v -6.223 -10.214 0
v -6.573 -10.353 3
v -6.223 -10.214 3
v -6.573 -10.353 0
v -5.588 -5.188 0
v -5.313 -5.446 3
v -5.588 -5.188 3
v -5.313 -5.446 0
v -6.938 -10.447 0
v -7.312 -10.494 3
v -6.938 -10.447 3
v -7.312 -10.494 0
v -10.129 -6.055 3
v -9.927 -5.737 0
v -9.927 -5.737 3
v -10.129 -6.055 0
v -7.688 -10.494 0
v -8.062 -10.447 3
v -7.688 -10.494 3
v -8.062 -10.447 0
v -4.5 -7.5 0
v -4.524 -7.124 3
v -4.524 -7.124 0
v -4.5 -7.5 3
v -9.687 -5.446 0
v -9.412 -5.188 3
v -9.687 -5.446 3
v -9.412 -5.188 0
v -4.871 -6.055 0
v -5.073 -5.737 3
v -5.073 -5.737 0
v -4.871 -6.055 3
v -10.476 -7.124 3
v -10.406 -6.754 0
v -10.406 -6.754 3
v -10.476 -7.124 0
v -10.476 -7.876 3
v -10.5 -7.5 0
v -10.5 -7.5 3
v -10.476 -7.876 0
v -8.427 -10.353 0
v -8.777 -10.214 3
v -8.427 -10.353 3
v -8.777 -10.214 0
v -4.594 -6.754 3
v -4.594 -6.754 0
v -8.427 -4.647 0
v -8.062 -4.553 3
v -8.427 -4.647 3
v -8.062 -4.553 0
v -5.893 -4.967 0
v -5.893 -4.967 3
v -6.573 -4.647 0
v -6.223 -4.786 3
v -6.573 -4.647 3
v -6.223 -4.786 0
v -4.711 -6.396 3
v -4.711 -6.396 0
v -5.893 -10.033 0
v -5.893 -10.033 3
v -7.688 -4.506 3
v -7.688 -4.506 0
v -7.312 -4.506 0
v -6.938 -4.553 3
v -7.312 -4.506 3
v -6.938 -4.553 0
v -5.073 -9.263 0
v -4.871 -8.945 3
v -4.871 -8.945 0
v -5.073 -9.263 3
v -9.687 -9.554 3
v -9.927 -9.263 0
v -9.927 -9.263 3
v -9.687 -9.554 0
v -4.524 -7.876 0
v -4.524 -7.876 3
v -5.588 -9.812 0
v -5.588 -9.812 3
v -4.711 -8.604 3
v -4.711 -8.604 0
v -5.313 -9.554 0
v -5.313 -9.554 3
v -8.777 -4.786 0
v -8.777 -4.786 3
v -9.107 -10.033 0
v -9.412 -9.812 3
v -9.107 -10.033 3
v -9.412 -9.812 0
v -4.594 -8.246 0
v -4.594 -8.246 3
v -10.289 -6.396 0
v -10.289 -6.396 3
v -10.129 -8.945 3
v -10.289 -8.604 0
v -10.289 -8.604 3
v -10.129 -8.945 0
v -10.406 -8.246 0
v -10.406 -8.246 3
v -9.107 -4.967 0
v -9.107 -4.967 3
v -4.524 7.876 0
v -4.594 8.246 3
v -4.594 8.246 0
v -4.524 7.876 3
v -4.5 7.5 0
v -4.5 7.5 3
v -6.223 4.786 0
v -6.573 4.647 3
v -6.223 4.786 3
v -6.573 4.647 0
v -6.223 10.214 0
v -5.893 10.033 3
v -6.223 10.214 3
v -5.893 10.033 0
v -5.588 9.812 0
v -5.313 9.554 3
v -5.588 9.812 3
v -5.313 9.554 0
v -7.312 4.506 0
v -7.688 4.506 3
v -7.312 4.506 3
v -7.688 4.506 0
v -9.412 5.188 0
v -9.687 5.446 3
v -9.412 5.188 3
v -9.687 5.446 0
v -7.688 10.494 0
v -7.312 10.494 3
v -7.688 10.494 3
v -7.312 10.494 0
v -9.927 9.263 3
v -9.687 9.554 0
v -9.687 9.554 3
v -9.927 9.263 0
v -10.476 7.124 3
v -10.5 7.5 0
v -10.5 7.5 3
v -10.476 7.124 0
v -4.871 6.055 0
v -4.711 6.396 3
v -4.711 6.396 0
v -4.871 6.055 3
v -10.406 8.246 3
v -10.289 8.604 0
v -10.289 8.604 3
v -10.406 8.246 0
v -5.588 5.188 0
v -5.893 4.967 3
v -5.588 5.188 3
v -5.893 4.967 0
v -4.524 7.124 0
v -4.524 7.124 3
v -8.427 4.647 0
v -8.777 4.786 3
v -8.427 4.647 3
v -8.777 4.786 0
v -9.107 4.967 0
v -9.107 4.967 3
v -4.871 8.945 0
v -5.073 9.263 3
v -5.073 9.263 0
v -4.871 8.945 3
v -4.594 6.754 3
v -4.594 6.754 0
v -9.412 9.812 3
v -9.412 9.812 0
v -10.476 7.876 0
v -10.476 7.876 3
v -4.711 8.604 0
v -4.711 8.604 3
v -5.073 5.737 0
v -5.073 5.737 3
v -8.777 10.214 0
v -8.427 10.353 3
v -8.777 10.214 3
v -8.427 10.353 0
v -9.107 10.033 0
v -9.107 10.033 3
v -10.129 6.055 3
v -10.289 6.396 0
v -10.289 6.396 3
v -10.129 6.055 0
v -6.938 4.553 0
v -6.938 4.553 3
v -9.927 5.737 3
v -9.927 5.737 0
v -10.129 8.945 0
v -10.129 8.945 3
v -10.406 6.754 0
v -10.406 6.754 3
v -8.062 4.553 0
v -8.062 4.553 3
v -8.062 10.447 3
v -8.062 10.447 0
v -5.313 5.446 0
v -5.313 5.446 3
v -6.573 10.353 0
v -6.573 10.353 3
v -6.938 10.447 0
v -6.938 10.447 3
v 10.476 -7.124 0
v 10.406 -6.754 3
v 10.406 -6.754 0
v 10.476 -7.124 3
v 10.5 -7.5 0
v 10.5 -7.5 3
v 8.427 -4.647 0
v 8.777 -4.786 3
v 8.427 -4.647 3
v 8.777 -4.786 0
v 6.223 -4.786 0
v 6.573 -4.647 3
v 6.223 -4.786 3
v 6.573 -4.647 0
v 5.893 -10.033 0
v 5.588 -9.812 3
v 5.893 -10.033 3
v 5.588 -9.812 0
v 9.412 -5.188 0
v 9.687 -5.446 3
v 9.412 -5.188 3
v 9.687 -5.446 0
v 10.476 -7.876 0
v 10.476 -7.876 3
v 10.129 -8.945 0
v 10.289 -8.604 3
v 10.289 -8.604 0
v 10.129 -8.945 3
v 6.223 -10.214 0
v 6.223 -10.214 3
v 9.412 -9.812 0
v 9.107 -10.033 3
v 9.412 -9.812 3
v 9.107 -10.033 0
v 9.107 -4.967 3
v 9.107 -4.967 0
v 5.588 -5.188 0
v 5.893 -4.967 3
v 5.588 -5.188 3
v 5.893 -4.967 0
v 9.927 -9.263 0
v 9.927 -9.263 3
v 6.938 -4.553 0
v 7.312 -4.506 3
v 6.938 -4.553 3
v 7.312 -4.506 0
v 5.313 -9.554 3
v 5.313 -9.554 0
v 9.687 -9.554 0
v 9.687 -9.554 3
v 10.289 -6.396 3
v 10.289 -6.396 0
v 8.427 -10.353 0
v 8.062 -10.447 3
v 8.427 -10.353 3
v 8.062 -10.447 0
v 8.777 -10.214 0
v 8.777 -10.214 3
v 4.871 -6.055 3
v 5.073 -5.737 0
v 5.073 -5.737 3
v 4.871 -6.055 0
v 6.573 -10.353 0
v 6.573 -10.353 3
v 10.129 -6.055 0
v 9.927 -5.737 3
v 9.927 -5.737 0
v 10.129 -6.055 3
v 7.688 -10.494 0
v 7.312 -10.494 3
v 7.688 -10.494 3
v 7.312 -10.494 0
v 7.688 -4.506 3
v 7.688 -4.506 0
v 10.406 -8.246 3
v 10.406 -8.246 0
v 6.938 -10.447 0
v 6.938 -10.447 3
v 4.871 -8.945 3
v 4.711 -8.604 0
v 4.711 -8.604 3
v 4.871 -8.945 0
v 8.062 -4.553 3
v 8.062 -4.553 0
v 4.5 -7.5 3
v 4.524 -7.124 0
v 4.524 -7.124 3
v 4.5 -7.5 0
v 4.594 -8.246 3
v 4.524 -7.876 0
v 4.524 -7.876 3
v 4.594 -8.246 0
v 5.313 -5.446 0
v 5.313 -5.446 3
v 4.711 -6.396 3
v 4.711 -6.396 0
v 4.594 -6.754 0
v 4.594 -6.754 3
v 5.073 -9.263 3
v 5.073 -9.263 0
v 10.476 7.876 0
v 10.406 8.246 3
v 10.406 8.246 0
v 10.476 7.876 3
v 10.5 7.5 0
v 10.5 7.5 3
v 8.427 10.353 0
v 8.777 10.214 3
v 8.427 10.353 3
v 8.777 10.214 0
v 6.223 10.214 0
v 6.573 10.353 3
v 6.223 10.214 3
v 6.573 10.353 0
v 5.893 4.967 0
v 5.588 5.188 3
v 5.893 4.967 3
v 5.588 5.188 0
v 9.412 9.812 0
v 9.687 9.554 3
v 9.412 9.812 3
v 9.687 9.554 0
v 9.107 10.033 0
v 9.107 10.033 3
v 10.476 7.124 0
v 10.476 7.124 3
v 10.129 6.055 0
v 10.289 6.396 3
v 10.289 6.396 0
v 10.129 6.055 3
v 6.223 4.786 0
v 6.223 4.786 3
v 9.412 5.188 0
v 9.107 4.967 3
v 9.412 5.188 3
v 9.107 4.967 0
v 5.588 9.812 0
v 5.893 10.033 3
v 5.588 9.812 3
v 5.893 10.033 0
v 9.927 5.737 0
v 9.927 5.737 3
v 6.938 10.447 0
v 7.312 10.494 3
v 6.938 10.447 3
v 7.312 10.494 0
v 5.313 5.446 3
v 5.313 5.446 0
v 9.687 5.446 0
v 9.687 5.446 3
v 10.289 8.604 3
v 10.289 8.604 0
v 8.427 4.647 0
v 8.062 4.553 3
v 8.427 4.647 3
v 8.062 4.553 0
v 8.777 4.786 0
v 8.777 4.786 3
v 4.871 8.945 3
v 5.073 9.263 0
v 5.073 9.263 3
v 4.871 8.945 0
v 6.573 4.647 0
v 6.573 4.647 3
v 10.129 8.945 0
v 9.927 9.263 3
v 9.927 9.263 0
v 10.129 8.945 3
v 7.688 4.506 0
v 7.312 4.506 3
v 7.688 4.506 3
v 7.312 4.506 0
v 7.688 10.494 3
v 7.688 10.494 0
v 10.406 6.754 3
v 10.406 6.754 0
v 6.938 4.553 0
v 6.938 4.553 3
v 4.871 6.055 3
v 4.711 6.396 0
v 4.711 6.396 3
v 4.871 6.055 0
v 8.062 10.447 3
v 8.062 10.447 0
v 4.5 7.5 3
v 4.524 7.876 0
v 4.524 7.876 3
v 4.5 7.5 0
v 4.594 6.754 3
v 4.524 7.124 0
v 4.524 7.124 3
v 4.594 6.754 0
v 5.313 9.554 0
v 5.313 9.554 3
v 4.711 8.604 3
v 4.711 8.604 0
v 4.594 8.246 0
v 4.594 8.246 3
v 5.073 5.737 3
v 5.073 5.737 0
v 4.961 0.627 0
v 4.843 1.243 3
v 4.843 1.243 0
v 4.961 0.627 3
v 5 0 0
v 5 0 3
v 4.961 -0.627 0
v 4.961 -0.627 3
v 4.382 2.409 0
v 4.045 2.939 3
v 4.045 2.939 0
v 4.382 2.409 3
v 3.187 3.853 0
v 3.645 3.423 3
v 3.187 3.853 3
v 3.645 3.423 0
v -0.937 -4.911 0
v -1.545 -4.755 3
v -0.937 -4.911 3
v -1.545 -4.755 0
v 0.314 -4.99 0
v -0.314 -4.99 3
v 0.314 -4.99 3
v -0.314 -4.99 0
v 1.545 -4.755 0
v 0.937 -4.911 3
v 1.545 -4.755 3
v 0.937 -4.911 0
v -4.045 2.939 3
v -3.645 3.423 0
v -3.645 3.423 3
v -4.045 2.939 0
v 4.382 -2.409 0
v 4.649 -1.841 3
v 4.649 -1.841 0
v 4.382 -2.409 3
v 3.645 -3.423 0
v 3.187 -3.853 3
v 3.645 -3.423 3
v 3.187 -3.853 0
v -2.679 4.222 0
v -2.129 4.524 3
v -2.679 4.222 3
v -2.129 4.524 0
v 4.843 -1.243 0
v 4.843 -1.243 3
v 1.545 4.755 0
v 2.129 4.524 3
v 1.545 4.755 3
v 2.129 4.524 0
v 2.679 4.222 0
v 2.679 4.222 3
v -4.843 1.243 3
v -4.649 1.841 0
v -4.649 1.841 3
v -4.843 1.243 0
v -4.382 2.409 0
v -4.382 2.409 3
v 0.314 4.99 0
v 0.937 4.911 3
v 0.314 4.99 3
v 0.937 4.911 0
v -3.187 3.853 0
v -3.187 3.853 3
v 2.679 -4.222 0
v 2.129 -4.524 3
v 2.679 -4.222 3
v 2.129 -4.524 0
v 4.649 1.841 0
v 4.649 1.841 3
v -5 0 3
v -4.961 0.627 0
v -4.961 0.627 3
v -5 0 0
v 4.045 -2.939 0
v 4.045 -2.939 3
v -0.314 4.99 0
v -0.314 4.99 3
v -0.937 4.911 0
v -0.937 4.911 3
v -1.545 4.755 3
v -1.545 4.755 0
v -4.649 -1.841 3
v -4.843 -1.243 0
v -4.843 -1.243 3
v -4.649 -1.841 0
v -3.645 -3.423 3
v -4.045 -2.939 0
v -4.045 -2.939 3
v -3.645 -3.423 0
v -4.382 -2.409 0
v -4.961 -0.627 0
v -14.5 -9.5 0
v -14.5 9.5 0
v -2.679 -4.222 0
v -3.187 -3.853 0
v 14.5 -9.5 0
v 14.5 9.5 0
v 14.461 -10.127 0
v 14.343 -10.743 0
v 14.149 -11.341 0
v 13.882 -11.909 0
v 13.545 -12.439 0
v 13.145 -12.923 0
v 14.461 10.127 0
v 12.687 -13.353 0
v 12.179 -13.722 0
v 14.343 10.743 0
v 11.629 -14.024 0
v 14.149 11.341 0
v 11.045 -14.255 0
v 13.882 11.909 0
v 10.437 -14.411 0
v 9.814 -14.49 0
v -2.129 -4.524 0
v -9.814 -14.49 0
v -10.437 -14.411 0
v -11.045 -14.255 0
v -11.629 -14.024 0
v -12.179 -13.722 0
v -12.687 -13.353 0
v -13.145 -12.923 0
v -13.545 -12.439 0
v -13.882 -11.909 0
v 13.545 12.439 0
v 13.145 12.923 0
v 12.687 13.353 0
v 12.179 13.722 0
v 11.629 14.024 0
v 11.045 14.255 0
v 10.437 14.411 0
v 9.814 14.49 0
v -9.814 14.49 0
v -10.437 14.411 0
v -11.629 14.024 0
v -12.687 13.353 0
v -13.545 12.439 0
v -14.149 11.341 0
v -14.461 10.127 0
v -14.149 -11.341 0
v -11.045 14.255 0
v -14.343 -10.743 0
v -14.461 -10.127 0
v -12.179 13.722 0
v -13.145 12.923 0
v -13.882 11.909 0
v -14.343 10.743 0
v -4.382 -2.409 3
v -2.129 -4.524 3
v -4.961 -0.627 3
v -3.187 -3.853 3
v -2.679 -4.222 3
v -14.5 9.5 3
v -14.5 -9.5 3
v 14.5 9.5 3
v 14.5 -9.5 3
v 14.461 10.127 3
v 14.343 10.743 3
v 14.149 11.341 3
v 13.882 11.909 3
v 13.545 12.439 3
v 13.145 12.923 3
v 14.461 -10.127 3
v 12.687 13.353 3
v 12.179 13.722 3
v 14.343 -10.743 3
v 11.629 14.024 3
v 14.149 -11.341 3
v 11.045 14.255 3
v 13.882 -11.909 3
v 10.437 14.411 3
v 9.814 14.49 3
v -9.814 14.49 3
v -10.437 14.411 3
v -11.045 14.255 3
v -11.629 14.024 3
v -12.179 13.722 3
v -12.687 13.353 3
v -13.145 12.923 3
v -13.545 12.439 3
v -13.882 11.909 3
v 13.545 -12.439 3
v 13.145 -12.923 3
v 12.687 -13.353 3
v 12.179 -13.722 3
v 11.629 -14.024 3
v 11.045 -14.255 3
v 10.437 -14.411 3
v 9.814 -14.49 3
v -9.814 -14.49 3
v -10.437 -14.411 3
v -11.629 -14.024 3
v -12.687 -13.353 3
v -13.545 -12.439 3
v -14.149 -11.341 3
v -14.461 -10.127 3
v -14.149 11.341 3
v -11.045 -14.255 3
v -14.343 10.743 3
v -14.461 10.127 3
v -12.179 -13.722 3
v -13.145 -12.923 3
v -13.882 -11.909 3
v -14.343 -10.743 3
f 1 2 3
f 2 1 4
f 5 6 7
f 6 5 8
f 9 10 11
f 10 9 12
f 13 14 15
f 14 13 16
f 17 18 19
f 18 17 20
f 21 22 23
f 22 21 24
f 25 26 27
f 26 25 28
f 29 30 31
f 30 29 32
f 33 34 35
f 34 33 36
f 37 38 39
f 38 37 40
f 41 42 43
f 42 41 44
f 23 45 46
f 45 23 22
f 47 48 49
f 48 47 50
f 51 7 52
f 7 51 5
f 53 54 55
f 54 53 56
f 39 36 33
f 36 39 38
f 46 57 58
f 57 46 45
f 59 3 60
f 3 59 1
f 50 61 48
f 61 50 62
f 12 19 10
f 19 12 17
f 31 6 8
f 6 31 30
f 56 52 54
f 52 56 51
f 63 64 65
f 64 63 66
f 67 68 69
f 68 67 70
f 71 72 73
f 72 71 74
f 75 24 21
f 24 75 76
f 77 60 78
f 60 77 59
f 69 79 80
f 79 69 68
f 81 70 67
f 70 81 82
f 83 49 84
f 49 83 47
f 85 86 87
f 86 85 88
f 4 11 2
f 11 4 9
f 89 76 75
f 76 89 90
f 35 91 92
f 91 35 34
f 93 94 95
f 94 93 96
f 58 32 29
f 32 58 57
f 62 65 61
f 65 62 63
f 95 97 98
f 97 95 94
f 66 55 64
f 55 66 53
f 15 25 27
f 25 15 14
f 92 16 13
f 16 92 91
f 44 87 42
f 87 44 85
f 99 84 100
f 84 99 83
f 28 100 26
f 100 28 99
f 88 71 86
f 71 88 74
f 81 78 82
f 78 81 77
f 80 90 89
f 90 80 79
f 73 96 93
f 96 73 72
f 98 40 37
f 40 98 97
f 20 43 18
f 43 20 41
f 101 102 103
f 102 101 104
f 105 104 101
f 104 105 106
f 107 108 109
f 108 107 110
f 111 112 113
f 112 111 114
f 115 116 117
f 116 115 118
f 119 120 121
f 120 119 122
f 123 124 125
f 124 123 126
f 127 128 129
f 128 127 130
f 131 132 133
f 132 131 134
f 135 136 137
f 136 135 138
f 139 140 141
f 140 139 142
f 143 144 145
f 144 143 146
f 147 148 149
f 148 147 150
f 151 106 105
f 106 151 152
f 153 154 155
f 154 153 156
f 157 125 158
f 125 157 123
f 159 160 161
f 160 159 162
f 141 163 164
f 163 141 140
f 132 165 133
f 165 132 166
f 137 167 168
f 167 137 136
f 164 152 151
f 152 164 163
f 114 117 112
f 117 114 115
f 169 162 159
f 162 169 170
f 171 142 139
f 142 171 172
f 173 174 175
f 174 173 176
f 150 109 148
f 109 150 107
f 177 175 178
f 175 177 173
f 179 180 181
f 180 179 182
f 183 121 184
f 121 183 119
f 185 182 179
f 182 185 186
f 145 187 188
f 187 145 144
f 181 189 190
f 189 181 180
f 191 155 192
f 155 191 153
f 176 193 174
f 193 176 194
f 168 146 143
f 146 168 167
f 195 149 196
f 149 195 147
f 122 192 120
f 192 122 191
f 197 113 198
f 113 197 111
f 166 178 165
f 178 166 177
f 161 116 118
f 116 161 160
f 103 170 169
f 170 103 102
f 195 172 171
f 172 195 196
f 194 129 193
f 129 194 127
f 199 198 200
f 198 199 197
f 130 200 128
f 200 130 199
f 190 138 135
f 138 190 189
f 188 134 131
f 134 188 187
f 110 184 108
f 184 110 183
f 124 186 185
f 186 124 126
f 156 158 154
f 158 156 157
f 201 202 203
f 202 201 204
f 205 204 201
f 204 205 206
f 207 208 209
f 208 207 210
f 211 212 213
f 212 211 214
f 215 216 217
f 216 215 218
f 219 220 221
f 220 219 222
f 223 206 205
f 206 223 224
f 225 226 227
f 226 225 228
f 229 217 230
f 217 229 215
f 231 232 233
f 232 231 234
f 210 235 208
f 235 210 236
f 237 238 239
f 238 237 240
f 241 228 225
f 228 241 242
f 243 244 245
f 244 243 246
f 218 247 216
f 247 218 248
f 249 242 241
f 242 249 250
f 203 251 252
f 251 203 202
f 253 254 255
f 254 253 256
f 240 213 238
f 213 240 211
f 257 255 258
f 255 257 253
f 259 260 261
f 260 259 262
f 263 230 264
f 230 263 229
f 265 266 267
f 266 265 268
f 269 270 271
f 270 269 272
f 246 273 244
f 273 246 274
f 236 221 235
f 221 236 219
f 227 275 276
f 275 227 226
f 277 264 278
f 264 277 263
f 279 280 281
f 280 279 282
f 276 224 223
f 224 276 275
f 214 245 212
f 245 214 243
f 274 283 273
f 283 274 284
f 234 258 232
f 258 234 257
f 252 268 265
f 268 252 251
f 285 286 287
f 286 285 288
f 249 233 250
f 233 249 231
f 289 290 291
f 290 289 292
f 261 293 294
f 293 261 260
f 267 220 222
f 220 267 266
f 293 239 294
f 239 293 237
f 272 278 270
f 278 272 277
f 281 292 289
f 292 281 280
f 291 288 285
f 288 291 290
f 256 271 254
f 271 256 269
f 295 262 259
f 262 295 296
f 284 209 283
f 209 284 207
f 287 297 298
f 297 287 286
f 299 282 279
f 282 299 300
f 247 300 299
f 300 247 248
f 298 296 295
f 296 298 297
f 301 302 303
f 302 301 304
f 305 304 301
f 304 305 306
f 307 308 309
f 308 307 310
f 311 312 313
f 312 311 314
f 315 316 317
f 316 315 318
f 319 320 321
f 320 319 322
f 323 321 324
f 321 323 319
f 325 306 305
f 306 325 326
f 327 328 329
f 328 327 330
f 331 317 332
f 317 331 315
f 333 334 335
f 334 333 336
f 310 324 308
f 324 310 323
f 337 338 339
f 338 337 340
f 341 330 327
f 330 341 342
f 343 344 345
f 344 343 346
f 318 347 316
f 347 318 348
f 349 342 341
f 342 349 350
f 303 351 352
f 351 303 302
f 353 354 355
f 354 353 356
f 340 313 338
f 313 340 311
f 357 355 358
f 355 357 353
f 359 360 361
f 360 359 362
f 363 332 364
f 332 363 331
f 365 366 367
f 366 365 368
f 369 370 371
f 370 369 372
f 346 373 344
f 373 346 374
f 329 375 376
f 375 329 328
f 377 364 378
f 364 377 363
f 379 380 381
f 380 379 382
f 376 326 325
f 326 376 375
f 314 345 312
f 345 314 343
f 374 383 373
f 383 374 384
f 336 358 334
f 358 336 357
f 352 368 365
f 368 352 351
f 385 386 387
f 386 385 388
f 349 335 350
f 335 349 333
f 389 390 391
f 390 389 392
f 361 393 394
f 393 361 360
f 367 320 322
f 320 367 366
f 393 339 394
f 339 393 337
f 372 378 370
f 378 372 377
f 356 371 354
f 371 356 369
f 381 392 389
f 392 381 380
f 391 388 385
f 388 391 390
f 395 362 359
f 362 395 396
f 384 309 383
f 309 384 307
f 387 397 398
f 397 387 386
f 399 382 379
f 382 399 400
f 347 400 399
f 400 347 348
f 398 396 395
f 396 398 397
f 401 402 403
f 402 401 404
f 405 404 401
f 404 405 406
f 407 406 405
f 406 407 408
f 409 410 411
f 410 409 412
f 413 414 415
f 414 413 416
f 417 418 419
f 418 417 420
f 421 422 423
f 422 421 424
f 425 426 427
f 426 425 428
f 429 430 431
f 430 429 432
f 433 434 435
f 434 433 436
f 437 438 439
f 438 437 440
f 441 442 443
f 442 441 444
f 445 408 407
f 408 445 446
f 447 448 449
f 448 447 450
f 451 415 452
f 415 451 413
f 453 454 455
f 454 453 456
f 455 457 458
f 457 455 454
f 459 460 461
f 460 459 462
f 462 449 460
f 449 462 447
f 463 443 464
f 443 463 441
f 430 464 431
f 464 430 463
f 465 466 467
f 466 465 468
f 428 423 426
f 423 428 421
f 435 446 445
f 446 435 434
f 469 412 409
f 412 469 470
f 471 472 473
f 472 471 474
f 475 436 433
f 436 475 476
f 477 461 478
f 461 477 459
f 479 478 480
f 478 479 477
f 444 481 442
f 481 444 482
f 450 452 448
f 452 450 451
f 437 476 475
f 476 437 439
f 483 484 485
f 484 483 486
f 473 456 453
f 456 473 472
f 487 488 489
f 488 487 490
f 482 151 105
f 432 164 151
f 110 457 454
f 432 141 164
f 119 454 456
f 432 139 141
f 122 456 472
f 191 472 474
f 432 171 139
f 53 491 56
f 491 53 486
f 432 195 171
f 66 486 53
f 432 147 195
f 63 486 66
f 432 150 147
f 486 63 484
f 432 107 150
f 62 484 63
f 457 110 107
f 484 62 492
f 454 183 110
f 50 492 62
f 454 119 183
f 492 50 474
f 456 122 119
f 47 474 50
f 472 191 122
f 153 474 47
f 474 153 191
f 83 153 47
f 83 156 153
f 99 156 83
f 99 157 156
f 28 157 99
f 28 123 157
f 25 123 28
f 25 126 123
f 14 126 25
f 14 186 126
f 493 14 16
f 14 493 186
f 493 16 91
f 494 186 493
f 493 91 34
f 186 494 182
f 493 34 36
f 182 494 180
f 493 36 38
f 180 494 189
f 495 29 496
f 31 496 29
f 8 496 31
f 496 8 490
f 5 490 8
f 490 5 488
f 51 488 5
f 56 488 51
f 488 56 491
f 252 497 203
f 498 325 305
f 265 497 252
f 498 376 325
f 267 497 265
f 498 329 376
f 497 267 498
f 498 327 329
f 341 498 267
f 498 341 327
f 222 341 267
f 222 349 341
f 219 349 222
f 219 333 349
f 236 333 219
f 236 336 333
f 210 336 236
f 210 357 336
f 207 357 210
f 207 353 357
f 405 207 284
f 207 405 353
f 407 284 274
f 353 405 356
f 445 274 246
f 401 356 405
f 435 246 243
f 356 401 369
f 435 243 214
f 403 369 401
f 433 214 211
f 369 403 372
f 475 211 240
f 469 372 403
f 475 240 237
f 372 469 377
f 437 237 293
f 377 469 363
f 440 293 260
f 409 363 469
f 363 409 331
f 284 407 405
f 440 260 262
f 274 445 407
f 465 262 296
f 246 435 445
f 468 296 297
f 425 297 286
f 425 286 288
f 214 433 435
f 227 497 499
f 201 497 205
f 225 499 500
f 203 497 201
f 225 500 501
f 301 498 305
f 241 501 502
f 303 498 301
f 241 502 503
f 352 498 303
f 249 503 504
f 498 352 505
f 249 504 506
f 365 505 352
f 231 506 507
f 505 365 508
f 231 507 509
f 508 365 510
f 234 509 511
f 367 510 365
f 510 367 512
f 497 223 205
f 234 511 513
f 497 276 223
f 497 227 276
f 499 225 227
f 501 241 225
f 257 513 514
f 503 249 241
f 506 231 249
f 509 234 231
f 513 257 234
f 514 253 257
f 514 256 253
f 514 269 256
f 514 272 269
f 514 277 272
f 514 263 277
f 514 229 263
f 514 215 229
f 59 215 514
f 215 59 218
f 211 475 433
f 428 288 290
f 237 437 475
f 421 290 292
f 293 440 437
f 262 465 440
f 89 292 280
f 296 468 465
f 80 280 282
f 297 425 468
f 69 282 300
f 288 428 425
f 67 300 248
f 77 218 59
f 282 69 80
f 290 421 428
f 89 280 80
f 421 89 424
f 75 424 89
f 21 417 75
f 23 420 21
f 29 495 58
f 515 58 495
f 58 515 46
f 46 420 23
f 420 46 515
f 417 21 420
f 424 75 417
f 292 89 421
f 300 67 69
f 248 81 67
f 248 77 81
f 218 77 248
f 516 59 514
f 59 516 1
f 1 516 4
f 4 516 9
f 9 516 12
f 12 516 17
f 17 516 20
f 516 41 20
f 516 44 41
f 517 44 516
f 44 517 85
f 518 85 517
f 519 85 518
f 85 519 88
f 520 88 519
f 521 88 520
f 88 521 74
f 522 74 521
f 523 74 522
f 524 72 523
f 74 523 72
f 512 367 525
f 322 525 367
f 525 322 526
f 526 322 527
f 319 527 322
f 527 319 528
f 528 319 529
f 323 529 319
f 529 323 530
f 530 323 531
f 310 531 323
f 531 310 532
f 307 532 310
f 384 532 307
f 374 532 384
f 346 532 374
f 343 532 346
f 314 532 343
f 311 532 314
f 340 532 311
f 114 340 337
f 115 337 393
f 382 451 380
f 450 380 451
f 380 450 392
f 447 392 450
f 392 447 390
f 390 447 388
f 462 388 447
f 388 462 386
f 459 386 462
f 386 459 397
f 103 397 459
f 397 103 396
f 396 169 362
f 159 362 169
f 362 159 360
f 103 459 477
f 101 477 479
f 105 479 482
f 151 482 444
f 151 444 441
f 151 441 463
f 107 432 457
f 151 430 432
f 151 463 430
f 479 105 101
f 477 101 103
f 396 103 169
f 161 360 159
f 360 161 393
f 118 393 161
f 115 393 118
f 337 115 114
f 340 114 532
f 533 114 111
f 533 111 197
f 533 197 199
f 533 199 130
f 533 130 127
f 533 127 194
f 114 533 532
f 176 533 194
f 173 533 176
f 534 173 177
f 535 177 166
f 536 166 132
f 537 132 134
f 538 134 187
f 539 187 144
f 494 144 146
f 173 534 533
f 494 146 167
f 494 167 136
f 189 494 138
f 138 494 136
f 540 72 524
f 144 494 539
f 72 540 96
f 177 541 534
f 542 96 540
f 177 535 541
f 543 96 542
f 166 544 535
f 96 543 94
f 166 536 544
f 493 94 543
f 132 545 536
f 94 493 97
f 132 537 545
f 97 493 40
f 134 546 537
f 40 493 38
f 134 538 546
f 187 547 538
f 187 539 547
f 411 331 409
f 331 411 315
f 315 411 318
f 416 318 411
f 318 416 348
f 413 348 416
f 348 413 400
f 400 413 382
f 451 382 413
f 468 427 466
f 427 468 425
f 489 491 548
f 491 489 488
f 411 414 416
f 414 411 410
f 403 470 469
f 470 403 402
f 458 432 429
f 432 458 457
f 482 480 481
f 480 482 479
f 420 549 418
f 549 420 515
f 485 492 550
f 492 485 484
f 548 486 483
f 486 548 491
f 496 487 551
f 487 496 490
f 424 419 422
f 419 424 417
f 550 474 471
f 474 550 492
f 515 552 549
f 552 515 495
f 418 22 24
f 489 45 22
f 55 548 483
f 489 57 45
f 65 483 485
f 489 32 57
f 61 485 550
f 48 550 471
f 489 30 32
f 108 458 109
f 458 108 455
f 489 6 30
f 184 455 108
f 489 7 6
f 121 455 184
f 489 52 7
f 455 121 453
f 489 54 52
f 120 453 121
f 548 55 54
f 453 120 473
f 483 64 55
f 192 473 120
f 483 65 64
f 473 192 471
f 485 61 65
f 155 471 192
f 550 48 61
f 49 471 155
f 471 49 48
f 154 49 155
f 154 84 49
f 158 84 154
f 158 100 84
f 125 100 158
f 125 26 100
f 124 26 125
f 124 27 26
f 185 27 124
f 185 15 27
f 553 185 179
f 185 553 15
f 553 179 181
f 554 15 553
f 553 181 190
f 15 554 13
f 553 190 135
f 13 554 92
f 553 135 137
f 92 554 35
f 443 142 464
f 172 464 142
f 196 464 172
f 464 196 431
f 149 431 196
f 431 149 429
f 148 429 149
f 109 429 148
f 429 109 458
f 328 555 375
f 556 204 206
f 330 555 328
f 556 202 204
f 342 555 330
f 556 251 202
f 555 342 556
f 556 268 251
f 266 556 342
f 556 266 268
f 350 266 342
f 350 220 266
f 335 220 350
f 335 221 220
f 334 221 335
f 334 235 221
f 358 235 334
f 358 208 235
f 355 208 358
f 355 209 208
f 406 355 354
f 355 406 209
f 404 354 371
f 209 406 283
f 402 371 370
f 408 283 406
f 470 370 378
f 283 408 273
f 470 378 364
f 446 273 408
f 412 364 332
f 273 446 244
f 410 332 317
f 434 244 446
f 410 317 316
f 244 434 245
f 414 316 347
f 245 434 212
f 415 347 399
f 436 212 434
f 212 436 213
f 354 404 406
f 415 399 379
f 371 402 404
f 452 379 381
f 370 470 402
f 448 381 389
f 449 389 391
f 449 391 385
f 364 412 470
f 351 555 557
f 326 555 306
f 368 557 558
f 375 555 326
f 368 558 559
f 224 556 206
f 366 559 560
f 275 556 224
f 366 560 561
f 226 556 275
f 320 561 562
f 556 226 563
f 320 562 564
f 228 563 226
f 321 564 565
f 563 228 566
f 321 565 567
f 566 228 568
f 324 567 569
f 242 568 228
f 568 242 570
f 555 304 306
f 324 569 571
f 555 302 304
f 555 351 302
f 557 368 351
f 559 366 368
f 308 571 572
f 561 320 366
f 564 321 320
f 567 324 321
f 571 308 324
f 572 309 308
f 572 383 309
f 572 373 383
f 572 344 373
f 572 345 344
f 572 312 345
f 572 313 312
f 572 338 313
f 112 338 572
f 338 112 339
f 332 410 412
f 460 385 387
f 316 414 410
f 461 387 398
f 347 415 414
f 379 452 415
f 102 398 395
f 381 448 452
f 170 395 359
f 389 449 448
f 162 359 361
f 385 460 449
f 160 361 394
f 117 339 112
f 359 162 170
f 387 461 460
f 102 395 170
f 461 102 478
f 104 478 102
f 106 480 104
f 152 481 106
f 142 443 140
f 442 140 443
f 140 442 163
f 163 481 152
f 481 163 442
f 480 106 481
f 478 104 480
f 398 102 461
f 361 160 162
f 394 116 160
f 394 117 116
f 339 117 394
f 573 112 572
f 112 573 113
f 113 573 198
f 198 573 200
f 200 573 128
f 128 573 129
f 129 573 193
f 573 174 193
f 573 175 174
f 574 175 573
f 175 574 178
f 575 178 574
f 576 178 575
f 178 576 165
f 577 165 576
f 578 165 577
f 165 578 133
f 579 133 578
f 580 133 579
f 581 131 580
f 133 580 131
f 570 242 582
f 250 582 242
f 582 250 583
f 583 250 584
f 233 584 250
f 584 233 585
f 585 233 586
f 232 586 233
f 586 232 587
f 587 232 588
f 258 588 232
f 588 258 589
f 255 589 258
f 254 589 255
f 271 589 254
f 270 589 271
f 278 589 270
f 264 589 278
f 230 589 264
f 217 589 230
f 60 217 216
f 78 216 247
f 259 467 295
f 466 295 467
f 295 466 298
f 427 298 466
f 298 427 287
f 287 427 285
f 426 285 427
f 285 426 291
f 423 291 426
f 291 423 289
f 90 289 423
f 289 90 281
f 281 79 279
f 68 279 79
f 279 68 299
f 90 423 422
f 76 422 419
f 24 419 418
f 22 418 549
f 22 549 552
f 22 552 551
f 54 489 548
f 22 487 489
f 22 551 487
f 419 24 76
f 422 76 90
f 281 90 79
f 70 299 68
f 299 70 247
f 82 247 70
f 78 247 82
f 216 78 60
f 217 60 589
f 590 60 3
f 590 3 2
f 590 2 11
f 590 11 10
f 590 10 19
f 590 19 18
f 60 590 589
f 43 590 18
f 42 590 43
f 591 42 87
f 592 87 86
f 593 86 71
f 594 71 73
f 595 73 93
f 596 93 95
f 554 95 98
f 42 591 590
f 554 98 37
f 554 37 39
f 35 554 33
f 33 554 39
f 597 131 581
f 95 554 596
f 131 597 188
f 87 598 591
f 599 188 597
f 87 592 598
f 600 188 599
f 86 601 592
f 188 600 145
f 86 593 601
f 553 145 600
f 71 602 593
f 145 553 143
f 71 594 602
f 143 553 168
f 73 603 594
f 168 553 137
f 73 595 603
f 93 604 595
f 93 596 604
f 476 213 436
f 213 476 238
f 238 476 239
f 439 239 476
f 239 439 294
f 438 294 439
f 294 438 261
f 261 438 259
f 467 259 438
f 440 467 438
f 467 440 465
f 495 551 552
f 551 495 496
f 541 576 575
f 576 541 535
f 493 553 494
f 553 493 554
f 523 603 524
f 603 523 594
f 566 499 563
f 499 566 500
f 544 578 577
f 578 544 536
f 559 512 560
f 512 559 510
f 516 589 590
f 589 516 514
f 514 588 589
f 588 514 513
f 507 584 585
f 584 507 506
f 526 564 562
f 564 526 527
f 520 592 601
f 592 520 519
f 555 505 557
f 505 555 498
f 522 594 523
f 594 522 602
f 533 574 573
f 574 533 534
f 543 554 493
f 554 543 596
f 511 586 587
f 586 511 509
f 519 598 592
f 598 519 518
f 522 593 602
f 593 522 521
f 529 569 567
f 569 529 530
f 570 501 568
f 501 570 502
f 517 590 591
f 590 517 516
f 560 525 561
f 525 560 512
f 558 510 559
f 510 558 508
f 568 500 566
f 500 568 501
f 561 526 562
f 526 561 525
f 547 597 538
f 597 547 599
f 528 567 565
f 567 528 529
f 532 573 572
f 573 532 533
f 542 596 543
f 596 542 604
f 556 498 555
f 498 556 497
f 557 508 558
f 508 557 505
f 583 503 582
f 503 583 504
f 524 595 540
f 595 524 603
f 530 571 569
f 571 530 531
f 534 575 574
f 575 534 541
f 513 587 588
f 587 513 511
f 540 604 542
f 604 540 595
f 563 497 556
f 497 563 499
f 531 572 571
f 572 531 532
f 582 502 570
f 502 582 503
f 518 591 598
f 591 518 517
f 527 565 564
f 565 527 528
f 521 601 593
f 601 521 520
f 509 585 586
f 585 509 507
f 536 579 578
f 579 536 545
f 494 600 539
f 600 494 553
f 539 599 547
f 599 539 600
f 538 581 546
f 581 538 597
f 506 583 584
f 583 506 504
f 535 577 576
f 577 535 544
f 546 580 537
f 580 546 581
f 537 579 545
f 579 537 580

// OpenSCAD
$fn = 50;


difference() {
	union() {
		hull() {
			translate(v = [-9.5000000000, 9.5000000000, 0]) {
				cylinder(h = 3, r = 5);
			}
			translate(v = [9.5000000000, 9.5000000000, 0]) {
				cylinder(h = 3, r = 5);
			}
			translate(v = [-9.5000000000, -9.5000000000, 0]) {
				cylinder(h = 3, r = 5);
			}
			translate(v = [9.5000000000, -9.5000000000, 0]) {
				cylinder(h = 3, r = 5);
			}
		}
	}
	union() {
		#translate(v = [-7.5000000000, -7.5000000000, -100.0000000000]) {
			cylinder(h = 200, r = 3.0000000000);
		}
		#translate(v = [-7.5000000000, 7.5000000000, -100.0000000000]) {
			cylinder(h = 200, r = 3.0000000000);
		}
		#translate(v = [7.5000000000, -7.5000000000, -100.0000000000]) {
			cylinder(h = 200, r = 3.0000000000);
		}
		#translate(v = [7.5000000000, 7.5000000000, -100.0000000000]) {
			cylinder(h = 200, r = 3.0000000000);
		}
		#cylinder(h = 3, r = 5.0000000000);
	}
}
